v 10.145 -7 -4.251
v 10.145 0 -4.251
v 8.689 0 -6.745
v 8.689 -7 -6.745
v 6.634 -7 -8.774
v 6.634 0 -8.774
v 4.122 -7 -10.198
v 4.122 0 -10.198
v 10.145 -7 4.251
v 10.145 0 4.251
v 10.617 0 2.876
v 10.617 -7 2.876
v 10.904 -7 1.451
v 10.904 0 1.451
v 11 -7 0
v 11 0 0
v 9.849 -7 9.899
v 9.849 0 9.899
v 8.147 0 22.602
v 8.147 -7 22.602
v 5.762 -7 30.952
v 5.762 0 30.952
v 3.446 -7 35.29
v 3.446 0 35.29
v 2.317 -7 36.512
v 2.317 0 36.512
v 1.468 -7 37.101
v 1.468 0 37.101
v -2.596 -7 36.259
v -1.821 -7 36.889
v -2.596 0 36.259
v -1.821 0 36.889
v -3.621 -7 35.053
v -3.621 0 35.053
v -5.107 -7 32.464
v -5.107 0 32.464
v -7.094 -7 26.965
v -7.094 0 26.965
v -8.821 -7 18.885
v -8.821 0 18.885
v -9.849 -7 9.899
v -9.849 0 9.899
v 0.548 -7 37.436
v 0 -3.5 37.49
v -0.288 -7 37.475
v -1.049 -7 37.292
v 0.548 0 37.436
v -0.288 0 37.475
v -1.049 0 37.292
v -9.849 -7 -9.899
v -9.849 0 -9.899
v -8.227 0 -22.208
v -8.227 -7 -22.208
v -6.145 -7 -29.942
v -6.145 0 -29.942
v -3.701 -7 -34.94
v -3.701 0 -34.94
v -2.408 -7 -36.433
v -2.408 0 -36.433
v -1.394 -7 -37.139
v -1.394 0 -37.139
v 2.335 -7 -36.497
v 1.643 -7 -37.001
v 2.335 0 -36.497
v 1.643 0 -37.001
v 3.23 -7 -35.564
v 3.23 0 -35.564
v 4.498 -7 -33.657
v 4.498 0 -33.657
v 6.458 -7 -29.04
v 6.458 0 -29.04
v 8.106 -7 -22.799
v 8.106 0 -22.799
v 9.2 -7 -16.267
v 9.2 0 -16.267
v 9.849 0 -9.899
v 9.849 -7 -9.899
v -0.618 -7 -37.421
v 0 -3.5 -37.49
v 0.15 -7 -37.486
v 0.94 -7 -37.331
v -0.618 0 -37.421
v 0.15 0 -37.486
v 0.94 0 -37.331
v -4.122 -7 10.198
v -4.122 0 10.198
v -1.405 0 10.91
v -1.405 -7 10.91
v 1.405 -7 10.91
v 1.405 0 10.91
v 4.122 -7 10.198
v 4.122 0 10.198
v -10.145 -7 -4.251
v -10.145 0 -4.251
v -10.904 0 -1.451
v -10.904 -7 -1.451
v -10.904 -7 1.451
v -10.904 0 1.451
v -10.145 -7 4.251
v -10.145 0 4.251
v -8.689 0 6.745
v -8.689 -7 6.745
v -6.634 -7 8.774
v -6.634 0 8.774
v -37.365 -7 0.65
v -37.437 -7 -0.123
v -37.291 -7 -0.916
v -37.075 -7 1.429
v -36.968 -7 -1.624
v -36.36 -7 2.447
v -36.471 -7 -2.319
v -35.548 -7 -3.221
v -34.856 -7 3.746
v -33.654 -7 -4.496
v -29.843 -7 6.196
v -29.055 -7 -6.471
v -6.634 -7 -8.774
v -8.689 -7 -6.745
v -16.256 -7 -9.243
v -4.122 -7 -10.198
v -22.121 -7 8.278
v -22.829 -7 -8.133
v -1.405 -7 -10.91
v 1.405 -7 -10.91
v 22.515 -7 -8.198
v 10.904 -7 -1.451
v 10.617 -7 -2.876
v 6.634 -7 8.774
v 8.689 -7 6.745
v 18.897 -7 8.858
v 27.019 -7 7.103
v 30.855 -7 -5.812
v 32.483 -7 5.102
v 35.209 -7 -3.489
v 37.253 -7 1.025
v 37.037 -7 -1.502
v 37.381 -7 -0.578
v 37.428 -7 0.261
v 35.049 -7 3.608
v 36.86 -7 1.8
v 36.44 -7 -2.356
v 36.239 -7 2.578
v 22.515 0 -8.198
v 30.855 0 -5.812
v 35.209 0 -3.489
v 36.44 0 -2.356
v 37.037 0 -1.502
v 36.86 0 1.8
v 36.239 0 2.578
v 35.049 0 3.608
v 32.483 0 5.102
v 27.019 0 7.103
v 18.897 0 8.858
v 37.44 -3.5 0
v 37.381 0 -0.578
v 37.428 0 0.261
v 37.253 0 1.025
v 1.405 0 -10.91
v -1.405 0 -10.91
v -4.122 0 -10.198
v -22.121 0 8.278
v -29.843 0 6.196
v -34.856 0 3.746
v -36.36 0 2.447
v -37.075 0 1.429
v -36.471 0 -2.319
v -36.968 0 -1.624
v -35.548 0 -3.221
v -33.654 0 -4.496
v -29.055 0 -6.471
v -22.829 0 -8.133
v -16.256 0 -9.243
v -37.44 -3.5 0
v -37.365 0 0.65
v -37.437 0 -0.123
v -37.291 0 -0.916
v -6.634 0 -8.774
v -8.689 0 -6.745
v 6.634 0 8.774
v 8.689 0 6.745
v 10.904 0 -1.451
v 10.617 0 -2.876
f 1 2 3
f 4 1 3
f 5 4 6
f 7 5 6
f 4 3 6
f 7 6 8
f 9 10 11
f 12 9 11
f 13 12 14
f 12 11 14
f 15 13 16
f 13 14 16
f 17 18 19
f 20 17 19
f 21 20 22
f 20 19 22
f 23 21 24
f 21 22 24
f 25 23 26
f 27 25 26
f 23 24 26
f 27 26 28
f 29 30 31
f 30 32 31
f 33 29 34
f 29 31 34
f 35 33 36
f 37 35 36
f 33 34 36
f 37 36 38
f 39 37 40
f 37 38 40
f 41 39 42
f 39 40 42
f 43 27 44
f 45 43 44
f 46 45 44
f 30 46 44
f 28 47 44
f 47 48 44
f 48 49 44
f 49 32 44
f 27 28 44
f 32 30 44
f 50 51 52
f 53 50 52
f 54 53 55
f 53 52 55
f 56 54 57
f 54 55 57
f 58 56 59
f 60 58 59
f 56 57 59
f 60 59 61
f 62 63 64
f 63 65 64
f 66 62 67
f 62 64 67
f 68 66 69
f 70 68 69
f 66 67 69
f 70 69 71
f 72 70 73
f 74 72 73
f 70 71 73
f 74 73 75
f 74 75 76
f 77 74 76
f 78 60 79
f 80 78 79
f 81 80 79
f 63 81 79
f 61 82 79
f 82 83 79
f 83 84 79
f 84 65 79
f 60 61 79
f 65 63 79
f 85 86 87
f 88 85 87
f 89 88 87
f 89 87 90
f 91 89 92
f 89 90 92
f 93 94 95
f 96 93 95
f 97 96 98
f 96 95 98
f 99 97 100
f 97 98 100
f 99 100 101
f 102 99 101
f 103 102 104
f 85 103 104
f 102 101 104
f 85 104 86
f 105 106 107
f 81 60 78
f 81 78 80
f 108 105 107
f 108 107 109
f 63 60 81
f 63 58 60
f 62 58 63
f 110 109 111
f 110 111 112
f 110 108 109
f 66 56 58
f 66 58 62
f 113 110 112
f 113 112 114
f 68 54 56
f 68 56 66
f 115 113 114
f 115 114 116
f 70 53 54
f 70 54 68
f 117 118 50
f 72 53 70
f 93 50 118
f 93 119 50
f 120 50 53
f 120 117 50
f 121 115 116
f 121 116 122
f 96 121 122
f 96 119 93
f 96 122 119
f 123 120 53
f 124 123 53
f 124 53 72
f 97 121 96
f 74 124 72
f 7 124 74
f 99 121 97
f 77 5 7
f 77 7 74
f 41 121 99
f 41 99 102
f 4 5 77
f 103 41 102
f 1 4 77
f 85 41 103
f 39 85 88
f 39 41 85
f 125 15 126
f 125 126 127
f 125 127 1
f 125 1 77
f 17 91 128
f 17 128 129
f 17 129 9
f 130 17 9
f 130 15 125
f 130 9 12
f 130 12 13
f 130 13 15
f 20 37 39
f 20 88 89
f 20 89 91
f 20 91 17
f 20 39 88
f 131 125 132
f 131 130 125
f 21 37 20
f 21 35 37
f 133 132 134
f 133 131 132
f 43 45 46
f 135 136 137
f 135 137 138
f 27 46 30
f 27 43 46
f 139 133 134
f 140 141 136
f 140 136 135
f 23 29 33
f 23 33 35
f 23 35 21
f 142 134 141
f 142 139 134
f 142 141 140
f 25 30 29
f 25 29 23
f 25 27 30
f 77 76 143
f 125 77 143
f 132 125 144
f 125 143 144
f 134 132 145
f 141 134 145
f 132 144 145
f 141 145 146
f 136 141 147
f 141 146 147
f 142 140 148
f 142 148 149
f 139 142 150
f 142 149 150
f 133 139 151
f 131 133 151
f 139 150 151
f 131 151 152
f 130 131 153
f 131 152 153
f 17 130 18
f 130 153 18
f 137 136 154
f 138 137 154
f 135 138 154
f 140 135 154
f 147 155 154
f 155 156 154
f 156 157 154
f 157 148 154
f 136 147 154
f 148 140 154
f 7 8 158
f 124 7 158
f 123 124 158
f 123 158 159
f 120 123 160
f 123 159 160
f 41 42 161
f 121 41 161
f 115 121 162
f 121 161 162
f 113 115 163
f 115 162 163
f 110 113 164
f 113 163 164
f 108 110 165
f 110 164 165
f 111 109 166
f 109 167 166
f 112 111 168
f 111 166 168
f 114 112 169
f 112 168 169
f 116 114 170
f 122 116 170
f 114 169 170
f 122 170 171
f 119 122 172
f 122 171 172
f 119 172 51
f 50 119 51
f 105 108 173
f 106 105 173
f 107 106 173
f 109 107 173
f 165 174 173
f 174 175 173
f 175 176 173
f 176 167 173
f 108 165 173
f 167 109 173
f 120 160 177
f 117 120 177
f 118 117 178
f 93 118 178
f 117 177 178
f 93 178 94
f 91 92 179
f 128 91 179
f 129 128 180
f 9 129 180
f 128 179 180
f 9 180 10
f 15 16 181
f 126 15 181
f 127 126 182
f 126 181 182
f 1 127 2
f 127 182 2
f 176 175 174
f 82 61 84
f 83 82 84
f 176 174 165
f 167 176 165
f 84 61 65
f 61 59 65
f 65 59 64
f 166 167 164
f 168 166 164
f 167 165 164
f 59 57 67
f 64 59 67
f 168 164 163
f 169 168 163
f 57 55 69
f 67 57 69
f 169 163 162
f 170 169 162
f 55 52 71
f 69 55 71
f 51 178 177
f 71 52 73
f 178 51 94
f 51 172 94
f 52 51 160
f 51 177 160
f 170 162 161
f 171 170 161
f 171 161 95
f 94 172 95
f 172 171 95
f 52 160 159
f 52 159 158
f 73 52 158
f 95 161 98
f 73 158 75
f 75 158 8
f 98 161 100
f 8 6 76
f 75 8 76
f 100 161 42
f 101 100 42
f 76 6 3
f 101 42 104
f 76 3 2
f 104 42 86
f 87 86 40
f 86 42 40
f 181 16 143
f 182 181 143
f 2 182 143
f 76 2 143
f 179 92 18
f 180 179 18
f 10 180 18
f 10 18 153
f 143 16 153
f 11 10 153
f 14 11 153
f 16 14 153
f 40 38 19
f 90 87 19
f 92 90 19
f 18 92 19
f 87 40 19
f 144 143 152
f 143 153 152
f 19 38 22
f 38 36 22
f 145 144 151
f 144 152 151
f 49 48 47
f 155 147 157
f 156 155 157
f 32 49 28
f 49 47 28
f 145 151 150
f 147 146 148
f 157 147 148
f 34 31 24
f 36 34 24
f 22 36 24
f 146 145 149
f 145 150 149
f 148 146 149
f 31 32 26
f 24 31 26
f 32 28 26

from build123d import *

# Parameters (mm, degrees)
F1_DEPTH = 7


with BuildPart() as f1:
    # F0 (on Front) → F1 (new body)
    with BuildSketch(Plane.XZ):
        with BuildLine():
            ThreePointArc((10.1453197701, 4.2511747508), (10.7842134037, 2.168119292), (11, 0))
            ThreePointArc((11, 0), (10.7842134037, -2.168119292), (10.1453197701, -4.2511747508))
            add(Edge.make_bspline(
                [(9.8487678325, -9.8993528373), (10.0562281019, -7.1171506305), (10.1453197701, -4.2511747508)],
                knots=[4.4451668144, 4.4451668144, 4.4451668144, 4.5987496264, 4.5987496264, 4.5987496264], degree=2, weights=[1, 0.9970529886, 1]))
            add(Edge.make_bspline(
                [(9.8487678325, -9.8993528373), (37.4401472509, -7.8376344068), (37.4401472509, 0)],
                knots=[4.978574958, 4.978574958, 4.978574958, 6.2831853072, 6.2831853072, 6.2831853072], degree=2, weights=[1, 0.7946866243, 1]))
            add(Edge.make_bspline(
                [(37.4401472509, 0), (37.4401472509, 7.8376344068), (9.8487678325, 9.8993528373)],
                knots=[0, 0, 0, 1.3046103492, 1.3046103492, 1.3046103492], degree=2, weights=[1, 0.7946866243, 1]))
            add(Edge.make_bspline(
                [(10.1453197701, 4.2511747508), (10.0562281019, 7.1171506305), (9.8487678325, 9.8993528373)],
                knots=[4.8260283344, 4.8260283344, 4.8260283344, 4.9796111463, 4.9796111463, 4.9796111463], degree=2, weights=[1, 0.9970529886, 1]))
        make_face()
        with BuildLine():
            ThreePointArc((4.1223687661, 10.1983369113), (7.72877212, 7.8272652643), (10.1453197701, 4.2511747508))
            add(Edge.make_bspline(
                [(10.1453197701, 4.2511747508), (10.0562281019, 7.1171506305), (9.8487678325, 9.8993528373)],
                knots=[4.8260283344, 4.8260283344, 4.8260283344, 4.9796111463, 4.9796111463, 4.9796111463], degree=2, weights=[1, 0.9970529886, 1]))
            add(Edge.make_bspline(
                [(9.8487678325, 9.8993528373), (7.0281628, 10.1101177031), (4.1223687661, 10.1983369113)],
                knots=[1.3046103492, 1.3046103492, 1.3046103492, 1.4604670613, 1.4604670613, 1.4604670613], degree=2, weights=[1, 0.996965122, 1]))
        make_face()
        with BuildLine():
            add(Edge.make_bspline(
                [(9.8487678325, -9.8993528373), (10.0562281019, -7.1171506305), (10.1453197701, -4.2511747508)],
                knots=[4.4451668144, 4.4451668144, 4.4451668144, 4.5987496264, 4.5987496264, 4.5987496264], degree=2, weights=[1, 0.9970529886, 1]))
            ThreePointArc((10.1453197701, -4.2511747508), (7.72877212, -7.8272652643), (4.1223687661, -10.1983369113))
            add(Edge.make_bspline(
                [(4.1223687661, -10.1983369113), (7.0281628, -10.1101177031), (9.8487678325, -9.8993528373)],
                knots=[4.8227182459, 4.8227182459, 4.8227182459, 4.978574958, 4.978574958, 4.978574958], degree=2, weights=[1, 0.996965122, 1]))
        make_face()
        with BuildLine():
            ThreePointArc((-4.1223687661, 10.1983369113), (0, 11), (4.1223687661, 10.1983369113))
            add(Edge.make_bspline(
                [(9.8487678325, 9.8993528373), (7.0281628, 10.1101177031), (4.1223687661, 10.1983369113)],
                knots=[1.3046103492, 1.3046103492, 1.3046103492, 1.4604670613, 1.4604670613, 1.4604670613], degree=2, weights=[1, 0.996965122, 1]))
            add(Edge.make_bspline(
                [(9.8487678325, 9.8993528373), (7.7914186779, 37.4899916351), (0, 37.4899916351)],
                knots=[4.9796111463, 4.9796111463, 4.9796111463, 6.2831853072, 6.2831853072, 6.2831853072], degree=2, weights=[1, 0.7950010111, 1]))
            add(Edge.make_bspline(
                [(0, 37.4899916351), (-7.7914186779, 37.4899916351), (-9.8487678325, 9.8993528373)],
                knots=[0, 0, 0, 1.3035741608, 1.3035741608, 1.3035741608], degree=2, weights=[1, 0.7950010111, 1]))
            add(Edge.make_bspline(
                [(-4.1223687661, 10.1983369113), (-7.0281628, 10.1101177031), (-9.8487678325, 9.8993528373)],
                knots=[1.6811255923, 1.6811255923, 1.6811255923, 1.8369823044, 1.8369823044, 1.8369823044], degree=2, weights=[1, 0.996965122, 1]))
        make_face()
        with BuildLine():
            add(Edge.make_bspline(
                [(4.1223687661, -10.1983369113), (7.0281628, -10.1101177031), (9.8487678325, -9.8993528373)],
                knots=[4.8227182459, 4.8227182459, 4.8227182459, 4.978574958, 4.978574958, 4.978574958], degree=2, weights=[1, 0.996965122, 1]))
            ThreePointArc((4.1223687661, -10.1983369113), (0, -11), (-4.1223687661, -10.1983369113))
            add(Edge.make_bspline(
                [(-9.8487678325, -9.8993528373), (-7.0281628, -10.1101177031), (-4.1223687661, -10.1983369113)],
                knots=[4.4462030028, 4.4462030028, 4.4462030028, 4.6020597149, 4.6020597149, 4.6020597149], degree=2, weights=[1, 0.996965122, 1]))
            add(Edge.make_bspline(
                [(-9.8487678325, -9.8993528373), (0, -141.9789248751), (9.8487678325, -9.8993528373)],
                knots=[1.8380184927, 1.8380184927, 1.8380184927, 4.4451668144, 4.4451668144, 4.4451668144], degree=2, weights=[1, 0.2640532154, 1]))
        make_face()
        with BuildLine():
            ThreePointArc((-10.1453197701, 4.2511747508), (-7.72877212, 7.8272652643), (-4.1223687661, 10.1983369113))
            add(Edge.make_bspline(
                [(-4.1223687661, 10.1983369113), (-7.0281628, 10.1101177031), (-9.8487678325, 9.8993528373)],
                knots=[1.6811255923, 1.6811255923, 1.6811255923, 1.8369823044, 1.8369823044, 1.8369823044], degree=2, weights=[1, 0.996965122, 1]))
            add(Edge.make_bspline(
                [(-9.8487678325, 9.8993528373), (-10.0562281019, 7.1171506305), (-10.1453197701, 4.2511747508)],
                knots=[1.3035741608, 1.3035741608, 1.3035741608, 1.4571569728, 1.4571569728, 1.4571569728], degree=2, weights=[1, 0.9970529886, 1]))
        make_face()
        with BuildLine():
            add(Edge.make_bspline(
                [(-9.8487678325, -9.8993528373), (-7.0281628, -10.1101177031), (-4.1223687661, -10.1983369113)],
                knots=[4.4462030028, 4.4462030028, 4.4462030028, 4.6020597149, 4.6020597149, 4.6020597149], degree=2, weights=[1, 0.996965122, 1]))
            ThreePointArc((-4.1223687661, -10.1983369113), (-7.72877212, -7.8272652643), (-10.1453197701, -4.2511747508))
            add(Edge.make_bspline(
                [(-10.1453197701, -4.2511747508), (-10.0562281019, -7.1171506305), (-9.8487678325, -9.8993528373)],
                knots=[1.6844356808, 1.6844356808, 1.6844356808, 1.8380184927, 1.8380184927, 1.8380184927], degree=2, weights=[1, 0.9970529886, 1]))
        make_face()
        with BuildLine():
            add(Edge.make_bspline(
                [(-9.8487678325, 9.8993528373), (-142.3289339352, 0), (-9.8487678325, -9.8993528373)],
                knots=[1.8369823044, 1.8369823044, 1.8369823044, 4.4462030028, 4.4462030028, 4.4462030028], degree=2, weights=[1, 0.2630536618, 1]))
            add(Edge.make_bspline(
                [(-10.1453197701, -4.2511747508), (-10.0562281019, -7.1171506305), (-9.8487678325, -9.8993528373)],
                knots=[1.6844356808, 1.6844356808, 1.6844356808, 1.8380184927, 1.8380184927, 1.8380184927], degree=2, weights=[1, 0.9970529886, 1]))
            ThreePointArc((-10.1453197701, -4.2511747508), (-11, 0), (-10.1453197701, 4.2511747508))
            add(Edge.make_bspline(
                [(-9.8487678325, 9.8993528373), (-10.0562281019, 7.1171506305), (-10.1453197701, 4.2511747508)],
                knots=[1.3035741608, 1.3035741608, 1.3035741608, 1.4571569728, 1.4571569728, 1.4571569728], degree=2, weights=[1, 0.9970529886, 1]))
        make_face()
    extrude(amount=F1_DEPTH)


solid = f1.part
